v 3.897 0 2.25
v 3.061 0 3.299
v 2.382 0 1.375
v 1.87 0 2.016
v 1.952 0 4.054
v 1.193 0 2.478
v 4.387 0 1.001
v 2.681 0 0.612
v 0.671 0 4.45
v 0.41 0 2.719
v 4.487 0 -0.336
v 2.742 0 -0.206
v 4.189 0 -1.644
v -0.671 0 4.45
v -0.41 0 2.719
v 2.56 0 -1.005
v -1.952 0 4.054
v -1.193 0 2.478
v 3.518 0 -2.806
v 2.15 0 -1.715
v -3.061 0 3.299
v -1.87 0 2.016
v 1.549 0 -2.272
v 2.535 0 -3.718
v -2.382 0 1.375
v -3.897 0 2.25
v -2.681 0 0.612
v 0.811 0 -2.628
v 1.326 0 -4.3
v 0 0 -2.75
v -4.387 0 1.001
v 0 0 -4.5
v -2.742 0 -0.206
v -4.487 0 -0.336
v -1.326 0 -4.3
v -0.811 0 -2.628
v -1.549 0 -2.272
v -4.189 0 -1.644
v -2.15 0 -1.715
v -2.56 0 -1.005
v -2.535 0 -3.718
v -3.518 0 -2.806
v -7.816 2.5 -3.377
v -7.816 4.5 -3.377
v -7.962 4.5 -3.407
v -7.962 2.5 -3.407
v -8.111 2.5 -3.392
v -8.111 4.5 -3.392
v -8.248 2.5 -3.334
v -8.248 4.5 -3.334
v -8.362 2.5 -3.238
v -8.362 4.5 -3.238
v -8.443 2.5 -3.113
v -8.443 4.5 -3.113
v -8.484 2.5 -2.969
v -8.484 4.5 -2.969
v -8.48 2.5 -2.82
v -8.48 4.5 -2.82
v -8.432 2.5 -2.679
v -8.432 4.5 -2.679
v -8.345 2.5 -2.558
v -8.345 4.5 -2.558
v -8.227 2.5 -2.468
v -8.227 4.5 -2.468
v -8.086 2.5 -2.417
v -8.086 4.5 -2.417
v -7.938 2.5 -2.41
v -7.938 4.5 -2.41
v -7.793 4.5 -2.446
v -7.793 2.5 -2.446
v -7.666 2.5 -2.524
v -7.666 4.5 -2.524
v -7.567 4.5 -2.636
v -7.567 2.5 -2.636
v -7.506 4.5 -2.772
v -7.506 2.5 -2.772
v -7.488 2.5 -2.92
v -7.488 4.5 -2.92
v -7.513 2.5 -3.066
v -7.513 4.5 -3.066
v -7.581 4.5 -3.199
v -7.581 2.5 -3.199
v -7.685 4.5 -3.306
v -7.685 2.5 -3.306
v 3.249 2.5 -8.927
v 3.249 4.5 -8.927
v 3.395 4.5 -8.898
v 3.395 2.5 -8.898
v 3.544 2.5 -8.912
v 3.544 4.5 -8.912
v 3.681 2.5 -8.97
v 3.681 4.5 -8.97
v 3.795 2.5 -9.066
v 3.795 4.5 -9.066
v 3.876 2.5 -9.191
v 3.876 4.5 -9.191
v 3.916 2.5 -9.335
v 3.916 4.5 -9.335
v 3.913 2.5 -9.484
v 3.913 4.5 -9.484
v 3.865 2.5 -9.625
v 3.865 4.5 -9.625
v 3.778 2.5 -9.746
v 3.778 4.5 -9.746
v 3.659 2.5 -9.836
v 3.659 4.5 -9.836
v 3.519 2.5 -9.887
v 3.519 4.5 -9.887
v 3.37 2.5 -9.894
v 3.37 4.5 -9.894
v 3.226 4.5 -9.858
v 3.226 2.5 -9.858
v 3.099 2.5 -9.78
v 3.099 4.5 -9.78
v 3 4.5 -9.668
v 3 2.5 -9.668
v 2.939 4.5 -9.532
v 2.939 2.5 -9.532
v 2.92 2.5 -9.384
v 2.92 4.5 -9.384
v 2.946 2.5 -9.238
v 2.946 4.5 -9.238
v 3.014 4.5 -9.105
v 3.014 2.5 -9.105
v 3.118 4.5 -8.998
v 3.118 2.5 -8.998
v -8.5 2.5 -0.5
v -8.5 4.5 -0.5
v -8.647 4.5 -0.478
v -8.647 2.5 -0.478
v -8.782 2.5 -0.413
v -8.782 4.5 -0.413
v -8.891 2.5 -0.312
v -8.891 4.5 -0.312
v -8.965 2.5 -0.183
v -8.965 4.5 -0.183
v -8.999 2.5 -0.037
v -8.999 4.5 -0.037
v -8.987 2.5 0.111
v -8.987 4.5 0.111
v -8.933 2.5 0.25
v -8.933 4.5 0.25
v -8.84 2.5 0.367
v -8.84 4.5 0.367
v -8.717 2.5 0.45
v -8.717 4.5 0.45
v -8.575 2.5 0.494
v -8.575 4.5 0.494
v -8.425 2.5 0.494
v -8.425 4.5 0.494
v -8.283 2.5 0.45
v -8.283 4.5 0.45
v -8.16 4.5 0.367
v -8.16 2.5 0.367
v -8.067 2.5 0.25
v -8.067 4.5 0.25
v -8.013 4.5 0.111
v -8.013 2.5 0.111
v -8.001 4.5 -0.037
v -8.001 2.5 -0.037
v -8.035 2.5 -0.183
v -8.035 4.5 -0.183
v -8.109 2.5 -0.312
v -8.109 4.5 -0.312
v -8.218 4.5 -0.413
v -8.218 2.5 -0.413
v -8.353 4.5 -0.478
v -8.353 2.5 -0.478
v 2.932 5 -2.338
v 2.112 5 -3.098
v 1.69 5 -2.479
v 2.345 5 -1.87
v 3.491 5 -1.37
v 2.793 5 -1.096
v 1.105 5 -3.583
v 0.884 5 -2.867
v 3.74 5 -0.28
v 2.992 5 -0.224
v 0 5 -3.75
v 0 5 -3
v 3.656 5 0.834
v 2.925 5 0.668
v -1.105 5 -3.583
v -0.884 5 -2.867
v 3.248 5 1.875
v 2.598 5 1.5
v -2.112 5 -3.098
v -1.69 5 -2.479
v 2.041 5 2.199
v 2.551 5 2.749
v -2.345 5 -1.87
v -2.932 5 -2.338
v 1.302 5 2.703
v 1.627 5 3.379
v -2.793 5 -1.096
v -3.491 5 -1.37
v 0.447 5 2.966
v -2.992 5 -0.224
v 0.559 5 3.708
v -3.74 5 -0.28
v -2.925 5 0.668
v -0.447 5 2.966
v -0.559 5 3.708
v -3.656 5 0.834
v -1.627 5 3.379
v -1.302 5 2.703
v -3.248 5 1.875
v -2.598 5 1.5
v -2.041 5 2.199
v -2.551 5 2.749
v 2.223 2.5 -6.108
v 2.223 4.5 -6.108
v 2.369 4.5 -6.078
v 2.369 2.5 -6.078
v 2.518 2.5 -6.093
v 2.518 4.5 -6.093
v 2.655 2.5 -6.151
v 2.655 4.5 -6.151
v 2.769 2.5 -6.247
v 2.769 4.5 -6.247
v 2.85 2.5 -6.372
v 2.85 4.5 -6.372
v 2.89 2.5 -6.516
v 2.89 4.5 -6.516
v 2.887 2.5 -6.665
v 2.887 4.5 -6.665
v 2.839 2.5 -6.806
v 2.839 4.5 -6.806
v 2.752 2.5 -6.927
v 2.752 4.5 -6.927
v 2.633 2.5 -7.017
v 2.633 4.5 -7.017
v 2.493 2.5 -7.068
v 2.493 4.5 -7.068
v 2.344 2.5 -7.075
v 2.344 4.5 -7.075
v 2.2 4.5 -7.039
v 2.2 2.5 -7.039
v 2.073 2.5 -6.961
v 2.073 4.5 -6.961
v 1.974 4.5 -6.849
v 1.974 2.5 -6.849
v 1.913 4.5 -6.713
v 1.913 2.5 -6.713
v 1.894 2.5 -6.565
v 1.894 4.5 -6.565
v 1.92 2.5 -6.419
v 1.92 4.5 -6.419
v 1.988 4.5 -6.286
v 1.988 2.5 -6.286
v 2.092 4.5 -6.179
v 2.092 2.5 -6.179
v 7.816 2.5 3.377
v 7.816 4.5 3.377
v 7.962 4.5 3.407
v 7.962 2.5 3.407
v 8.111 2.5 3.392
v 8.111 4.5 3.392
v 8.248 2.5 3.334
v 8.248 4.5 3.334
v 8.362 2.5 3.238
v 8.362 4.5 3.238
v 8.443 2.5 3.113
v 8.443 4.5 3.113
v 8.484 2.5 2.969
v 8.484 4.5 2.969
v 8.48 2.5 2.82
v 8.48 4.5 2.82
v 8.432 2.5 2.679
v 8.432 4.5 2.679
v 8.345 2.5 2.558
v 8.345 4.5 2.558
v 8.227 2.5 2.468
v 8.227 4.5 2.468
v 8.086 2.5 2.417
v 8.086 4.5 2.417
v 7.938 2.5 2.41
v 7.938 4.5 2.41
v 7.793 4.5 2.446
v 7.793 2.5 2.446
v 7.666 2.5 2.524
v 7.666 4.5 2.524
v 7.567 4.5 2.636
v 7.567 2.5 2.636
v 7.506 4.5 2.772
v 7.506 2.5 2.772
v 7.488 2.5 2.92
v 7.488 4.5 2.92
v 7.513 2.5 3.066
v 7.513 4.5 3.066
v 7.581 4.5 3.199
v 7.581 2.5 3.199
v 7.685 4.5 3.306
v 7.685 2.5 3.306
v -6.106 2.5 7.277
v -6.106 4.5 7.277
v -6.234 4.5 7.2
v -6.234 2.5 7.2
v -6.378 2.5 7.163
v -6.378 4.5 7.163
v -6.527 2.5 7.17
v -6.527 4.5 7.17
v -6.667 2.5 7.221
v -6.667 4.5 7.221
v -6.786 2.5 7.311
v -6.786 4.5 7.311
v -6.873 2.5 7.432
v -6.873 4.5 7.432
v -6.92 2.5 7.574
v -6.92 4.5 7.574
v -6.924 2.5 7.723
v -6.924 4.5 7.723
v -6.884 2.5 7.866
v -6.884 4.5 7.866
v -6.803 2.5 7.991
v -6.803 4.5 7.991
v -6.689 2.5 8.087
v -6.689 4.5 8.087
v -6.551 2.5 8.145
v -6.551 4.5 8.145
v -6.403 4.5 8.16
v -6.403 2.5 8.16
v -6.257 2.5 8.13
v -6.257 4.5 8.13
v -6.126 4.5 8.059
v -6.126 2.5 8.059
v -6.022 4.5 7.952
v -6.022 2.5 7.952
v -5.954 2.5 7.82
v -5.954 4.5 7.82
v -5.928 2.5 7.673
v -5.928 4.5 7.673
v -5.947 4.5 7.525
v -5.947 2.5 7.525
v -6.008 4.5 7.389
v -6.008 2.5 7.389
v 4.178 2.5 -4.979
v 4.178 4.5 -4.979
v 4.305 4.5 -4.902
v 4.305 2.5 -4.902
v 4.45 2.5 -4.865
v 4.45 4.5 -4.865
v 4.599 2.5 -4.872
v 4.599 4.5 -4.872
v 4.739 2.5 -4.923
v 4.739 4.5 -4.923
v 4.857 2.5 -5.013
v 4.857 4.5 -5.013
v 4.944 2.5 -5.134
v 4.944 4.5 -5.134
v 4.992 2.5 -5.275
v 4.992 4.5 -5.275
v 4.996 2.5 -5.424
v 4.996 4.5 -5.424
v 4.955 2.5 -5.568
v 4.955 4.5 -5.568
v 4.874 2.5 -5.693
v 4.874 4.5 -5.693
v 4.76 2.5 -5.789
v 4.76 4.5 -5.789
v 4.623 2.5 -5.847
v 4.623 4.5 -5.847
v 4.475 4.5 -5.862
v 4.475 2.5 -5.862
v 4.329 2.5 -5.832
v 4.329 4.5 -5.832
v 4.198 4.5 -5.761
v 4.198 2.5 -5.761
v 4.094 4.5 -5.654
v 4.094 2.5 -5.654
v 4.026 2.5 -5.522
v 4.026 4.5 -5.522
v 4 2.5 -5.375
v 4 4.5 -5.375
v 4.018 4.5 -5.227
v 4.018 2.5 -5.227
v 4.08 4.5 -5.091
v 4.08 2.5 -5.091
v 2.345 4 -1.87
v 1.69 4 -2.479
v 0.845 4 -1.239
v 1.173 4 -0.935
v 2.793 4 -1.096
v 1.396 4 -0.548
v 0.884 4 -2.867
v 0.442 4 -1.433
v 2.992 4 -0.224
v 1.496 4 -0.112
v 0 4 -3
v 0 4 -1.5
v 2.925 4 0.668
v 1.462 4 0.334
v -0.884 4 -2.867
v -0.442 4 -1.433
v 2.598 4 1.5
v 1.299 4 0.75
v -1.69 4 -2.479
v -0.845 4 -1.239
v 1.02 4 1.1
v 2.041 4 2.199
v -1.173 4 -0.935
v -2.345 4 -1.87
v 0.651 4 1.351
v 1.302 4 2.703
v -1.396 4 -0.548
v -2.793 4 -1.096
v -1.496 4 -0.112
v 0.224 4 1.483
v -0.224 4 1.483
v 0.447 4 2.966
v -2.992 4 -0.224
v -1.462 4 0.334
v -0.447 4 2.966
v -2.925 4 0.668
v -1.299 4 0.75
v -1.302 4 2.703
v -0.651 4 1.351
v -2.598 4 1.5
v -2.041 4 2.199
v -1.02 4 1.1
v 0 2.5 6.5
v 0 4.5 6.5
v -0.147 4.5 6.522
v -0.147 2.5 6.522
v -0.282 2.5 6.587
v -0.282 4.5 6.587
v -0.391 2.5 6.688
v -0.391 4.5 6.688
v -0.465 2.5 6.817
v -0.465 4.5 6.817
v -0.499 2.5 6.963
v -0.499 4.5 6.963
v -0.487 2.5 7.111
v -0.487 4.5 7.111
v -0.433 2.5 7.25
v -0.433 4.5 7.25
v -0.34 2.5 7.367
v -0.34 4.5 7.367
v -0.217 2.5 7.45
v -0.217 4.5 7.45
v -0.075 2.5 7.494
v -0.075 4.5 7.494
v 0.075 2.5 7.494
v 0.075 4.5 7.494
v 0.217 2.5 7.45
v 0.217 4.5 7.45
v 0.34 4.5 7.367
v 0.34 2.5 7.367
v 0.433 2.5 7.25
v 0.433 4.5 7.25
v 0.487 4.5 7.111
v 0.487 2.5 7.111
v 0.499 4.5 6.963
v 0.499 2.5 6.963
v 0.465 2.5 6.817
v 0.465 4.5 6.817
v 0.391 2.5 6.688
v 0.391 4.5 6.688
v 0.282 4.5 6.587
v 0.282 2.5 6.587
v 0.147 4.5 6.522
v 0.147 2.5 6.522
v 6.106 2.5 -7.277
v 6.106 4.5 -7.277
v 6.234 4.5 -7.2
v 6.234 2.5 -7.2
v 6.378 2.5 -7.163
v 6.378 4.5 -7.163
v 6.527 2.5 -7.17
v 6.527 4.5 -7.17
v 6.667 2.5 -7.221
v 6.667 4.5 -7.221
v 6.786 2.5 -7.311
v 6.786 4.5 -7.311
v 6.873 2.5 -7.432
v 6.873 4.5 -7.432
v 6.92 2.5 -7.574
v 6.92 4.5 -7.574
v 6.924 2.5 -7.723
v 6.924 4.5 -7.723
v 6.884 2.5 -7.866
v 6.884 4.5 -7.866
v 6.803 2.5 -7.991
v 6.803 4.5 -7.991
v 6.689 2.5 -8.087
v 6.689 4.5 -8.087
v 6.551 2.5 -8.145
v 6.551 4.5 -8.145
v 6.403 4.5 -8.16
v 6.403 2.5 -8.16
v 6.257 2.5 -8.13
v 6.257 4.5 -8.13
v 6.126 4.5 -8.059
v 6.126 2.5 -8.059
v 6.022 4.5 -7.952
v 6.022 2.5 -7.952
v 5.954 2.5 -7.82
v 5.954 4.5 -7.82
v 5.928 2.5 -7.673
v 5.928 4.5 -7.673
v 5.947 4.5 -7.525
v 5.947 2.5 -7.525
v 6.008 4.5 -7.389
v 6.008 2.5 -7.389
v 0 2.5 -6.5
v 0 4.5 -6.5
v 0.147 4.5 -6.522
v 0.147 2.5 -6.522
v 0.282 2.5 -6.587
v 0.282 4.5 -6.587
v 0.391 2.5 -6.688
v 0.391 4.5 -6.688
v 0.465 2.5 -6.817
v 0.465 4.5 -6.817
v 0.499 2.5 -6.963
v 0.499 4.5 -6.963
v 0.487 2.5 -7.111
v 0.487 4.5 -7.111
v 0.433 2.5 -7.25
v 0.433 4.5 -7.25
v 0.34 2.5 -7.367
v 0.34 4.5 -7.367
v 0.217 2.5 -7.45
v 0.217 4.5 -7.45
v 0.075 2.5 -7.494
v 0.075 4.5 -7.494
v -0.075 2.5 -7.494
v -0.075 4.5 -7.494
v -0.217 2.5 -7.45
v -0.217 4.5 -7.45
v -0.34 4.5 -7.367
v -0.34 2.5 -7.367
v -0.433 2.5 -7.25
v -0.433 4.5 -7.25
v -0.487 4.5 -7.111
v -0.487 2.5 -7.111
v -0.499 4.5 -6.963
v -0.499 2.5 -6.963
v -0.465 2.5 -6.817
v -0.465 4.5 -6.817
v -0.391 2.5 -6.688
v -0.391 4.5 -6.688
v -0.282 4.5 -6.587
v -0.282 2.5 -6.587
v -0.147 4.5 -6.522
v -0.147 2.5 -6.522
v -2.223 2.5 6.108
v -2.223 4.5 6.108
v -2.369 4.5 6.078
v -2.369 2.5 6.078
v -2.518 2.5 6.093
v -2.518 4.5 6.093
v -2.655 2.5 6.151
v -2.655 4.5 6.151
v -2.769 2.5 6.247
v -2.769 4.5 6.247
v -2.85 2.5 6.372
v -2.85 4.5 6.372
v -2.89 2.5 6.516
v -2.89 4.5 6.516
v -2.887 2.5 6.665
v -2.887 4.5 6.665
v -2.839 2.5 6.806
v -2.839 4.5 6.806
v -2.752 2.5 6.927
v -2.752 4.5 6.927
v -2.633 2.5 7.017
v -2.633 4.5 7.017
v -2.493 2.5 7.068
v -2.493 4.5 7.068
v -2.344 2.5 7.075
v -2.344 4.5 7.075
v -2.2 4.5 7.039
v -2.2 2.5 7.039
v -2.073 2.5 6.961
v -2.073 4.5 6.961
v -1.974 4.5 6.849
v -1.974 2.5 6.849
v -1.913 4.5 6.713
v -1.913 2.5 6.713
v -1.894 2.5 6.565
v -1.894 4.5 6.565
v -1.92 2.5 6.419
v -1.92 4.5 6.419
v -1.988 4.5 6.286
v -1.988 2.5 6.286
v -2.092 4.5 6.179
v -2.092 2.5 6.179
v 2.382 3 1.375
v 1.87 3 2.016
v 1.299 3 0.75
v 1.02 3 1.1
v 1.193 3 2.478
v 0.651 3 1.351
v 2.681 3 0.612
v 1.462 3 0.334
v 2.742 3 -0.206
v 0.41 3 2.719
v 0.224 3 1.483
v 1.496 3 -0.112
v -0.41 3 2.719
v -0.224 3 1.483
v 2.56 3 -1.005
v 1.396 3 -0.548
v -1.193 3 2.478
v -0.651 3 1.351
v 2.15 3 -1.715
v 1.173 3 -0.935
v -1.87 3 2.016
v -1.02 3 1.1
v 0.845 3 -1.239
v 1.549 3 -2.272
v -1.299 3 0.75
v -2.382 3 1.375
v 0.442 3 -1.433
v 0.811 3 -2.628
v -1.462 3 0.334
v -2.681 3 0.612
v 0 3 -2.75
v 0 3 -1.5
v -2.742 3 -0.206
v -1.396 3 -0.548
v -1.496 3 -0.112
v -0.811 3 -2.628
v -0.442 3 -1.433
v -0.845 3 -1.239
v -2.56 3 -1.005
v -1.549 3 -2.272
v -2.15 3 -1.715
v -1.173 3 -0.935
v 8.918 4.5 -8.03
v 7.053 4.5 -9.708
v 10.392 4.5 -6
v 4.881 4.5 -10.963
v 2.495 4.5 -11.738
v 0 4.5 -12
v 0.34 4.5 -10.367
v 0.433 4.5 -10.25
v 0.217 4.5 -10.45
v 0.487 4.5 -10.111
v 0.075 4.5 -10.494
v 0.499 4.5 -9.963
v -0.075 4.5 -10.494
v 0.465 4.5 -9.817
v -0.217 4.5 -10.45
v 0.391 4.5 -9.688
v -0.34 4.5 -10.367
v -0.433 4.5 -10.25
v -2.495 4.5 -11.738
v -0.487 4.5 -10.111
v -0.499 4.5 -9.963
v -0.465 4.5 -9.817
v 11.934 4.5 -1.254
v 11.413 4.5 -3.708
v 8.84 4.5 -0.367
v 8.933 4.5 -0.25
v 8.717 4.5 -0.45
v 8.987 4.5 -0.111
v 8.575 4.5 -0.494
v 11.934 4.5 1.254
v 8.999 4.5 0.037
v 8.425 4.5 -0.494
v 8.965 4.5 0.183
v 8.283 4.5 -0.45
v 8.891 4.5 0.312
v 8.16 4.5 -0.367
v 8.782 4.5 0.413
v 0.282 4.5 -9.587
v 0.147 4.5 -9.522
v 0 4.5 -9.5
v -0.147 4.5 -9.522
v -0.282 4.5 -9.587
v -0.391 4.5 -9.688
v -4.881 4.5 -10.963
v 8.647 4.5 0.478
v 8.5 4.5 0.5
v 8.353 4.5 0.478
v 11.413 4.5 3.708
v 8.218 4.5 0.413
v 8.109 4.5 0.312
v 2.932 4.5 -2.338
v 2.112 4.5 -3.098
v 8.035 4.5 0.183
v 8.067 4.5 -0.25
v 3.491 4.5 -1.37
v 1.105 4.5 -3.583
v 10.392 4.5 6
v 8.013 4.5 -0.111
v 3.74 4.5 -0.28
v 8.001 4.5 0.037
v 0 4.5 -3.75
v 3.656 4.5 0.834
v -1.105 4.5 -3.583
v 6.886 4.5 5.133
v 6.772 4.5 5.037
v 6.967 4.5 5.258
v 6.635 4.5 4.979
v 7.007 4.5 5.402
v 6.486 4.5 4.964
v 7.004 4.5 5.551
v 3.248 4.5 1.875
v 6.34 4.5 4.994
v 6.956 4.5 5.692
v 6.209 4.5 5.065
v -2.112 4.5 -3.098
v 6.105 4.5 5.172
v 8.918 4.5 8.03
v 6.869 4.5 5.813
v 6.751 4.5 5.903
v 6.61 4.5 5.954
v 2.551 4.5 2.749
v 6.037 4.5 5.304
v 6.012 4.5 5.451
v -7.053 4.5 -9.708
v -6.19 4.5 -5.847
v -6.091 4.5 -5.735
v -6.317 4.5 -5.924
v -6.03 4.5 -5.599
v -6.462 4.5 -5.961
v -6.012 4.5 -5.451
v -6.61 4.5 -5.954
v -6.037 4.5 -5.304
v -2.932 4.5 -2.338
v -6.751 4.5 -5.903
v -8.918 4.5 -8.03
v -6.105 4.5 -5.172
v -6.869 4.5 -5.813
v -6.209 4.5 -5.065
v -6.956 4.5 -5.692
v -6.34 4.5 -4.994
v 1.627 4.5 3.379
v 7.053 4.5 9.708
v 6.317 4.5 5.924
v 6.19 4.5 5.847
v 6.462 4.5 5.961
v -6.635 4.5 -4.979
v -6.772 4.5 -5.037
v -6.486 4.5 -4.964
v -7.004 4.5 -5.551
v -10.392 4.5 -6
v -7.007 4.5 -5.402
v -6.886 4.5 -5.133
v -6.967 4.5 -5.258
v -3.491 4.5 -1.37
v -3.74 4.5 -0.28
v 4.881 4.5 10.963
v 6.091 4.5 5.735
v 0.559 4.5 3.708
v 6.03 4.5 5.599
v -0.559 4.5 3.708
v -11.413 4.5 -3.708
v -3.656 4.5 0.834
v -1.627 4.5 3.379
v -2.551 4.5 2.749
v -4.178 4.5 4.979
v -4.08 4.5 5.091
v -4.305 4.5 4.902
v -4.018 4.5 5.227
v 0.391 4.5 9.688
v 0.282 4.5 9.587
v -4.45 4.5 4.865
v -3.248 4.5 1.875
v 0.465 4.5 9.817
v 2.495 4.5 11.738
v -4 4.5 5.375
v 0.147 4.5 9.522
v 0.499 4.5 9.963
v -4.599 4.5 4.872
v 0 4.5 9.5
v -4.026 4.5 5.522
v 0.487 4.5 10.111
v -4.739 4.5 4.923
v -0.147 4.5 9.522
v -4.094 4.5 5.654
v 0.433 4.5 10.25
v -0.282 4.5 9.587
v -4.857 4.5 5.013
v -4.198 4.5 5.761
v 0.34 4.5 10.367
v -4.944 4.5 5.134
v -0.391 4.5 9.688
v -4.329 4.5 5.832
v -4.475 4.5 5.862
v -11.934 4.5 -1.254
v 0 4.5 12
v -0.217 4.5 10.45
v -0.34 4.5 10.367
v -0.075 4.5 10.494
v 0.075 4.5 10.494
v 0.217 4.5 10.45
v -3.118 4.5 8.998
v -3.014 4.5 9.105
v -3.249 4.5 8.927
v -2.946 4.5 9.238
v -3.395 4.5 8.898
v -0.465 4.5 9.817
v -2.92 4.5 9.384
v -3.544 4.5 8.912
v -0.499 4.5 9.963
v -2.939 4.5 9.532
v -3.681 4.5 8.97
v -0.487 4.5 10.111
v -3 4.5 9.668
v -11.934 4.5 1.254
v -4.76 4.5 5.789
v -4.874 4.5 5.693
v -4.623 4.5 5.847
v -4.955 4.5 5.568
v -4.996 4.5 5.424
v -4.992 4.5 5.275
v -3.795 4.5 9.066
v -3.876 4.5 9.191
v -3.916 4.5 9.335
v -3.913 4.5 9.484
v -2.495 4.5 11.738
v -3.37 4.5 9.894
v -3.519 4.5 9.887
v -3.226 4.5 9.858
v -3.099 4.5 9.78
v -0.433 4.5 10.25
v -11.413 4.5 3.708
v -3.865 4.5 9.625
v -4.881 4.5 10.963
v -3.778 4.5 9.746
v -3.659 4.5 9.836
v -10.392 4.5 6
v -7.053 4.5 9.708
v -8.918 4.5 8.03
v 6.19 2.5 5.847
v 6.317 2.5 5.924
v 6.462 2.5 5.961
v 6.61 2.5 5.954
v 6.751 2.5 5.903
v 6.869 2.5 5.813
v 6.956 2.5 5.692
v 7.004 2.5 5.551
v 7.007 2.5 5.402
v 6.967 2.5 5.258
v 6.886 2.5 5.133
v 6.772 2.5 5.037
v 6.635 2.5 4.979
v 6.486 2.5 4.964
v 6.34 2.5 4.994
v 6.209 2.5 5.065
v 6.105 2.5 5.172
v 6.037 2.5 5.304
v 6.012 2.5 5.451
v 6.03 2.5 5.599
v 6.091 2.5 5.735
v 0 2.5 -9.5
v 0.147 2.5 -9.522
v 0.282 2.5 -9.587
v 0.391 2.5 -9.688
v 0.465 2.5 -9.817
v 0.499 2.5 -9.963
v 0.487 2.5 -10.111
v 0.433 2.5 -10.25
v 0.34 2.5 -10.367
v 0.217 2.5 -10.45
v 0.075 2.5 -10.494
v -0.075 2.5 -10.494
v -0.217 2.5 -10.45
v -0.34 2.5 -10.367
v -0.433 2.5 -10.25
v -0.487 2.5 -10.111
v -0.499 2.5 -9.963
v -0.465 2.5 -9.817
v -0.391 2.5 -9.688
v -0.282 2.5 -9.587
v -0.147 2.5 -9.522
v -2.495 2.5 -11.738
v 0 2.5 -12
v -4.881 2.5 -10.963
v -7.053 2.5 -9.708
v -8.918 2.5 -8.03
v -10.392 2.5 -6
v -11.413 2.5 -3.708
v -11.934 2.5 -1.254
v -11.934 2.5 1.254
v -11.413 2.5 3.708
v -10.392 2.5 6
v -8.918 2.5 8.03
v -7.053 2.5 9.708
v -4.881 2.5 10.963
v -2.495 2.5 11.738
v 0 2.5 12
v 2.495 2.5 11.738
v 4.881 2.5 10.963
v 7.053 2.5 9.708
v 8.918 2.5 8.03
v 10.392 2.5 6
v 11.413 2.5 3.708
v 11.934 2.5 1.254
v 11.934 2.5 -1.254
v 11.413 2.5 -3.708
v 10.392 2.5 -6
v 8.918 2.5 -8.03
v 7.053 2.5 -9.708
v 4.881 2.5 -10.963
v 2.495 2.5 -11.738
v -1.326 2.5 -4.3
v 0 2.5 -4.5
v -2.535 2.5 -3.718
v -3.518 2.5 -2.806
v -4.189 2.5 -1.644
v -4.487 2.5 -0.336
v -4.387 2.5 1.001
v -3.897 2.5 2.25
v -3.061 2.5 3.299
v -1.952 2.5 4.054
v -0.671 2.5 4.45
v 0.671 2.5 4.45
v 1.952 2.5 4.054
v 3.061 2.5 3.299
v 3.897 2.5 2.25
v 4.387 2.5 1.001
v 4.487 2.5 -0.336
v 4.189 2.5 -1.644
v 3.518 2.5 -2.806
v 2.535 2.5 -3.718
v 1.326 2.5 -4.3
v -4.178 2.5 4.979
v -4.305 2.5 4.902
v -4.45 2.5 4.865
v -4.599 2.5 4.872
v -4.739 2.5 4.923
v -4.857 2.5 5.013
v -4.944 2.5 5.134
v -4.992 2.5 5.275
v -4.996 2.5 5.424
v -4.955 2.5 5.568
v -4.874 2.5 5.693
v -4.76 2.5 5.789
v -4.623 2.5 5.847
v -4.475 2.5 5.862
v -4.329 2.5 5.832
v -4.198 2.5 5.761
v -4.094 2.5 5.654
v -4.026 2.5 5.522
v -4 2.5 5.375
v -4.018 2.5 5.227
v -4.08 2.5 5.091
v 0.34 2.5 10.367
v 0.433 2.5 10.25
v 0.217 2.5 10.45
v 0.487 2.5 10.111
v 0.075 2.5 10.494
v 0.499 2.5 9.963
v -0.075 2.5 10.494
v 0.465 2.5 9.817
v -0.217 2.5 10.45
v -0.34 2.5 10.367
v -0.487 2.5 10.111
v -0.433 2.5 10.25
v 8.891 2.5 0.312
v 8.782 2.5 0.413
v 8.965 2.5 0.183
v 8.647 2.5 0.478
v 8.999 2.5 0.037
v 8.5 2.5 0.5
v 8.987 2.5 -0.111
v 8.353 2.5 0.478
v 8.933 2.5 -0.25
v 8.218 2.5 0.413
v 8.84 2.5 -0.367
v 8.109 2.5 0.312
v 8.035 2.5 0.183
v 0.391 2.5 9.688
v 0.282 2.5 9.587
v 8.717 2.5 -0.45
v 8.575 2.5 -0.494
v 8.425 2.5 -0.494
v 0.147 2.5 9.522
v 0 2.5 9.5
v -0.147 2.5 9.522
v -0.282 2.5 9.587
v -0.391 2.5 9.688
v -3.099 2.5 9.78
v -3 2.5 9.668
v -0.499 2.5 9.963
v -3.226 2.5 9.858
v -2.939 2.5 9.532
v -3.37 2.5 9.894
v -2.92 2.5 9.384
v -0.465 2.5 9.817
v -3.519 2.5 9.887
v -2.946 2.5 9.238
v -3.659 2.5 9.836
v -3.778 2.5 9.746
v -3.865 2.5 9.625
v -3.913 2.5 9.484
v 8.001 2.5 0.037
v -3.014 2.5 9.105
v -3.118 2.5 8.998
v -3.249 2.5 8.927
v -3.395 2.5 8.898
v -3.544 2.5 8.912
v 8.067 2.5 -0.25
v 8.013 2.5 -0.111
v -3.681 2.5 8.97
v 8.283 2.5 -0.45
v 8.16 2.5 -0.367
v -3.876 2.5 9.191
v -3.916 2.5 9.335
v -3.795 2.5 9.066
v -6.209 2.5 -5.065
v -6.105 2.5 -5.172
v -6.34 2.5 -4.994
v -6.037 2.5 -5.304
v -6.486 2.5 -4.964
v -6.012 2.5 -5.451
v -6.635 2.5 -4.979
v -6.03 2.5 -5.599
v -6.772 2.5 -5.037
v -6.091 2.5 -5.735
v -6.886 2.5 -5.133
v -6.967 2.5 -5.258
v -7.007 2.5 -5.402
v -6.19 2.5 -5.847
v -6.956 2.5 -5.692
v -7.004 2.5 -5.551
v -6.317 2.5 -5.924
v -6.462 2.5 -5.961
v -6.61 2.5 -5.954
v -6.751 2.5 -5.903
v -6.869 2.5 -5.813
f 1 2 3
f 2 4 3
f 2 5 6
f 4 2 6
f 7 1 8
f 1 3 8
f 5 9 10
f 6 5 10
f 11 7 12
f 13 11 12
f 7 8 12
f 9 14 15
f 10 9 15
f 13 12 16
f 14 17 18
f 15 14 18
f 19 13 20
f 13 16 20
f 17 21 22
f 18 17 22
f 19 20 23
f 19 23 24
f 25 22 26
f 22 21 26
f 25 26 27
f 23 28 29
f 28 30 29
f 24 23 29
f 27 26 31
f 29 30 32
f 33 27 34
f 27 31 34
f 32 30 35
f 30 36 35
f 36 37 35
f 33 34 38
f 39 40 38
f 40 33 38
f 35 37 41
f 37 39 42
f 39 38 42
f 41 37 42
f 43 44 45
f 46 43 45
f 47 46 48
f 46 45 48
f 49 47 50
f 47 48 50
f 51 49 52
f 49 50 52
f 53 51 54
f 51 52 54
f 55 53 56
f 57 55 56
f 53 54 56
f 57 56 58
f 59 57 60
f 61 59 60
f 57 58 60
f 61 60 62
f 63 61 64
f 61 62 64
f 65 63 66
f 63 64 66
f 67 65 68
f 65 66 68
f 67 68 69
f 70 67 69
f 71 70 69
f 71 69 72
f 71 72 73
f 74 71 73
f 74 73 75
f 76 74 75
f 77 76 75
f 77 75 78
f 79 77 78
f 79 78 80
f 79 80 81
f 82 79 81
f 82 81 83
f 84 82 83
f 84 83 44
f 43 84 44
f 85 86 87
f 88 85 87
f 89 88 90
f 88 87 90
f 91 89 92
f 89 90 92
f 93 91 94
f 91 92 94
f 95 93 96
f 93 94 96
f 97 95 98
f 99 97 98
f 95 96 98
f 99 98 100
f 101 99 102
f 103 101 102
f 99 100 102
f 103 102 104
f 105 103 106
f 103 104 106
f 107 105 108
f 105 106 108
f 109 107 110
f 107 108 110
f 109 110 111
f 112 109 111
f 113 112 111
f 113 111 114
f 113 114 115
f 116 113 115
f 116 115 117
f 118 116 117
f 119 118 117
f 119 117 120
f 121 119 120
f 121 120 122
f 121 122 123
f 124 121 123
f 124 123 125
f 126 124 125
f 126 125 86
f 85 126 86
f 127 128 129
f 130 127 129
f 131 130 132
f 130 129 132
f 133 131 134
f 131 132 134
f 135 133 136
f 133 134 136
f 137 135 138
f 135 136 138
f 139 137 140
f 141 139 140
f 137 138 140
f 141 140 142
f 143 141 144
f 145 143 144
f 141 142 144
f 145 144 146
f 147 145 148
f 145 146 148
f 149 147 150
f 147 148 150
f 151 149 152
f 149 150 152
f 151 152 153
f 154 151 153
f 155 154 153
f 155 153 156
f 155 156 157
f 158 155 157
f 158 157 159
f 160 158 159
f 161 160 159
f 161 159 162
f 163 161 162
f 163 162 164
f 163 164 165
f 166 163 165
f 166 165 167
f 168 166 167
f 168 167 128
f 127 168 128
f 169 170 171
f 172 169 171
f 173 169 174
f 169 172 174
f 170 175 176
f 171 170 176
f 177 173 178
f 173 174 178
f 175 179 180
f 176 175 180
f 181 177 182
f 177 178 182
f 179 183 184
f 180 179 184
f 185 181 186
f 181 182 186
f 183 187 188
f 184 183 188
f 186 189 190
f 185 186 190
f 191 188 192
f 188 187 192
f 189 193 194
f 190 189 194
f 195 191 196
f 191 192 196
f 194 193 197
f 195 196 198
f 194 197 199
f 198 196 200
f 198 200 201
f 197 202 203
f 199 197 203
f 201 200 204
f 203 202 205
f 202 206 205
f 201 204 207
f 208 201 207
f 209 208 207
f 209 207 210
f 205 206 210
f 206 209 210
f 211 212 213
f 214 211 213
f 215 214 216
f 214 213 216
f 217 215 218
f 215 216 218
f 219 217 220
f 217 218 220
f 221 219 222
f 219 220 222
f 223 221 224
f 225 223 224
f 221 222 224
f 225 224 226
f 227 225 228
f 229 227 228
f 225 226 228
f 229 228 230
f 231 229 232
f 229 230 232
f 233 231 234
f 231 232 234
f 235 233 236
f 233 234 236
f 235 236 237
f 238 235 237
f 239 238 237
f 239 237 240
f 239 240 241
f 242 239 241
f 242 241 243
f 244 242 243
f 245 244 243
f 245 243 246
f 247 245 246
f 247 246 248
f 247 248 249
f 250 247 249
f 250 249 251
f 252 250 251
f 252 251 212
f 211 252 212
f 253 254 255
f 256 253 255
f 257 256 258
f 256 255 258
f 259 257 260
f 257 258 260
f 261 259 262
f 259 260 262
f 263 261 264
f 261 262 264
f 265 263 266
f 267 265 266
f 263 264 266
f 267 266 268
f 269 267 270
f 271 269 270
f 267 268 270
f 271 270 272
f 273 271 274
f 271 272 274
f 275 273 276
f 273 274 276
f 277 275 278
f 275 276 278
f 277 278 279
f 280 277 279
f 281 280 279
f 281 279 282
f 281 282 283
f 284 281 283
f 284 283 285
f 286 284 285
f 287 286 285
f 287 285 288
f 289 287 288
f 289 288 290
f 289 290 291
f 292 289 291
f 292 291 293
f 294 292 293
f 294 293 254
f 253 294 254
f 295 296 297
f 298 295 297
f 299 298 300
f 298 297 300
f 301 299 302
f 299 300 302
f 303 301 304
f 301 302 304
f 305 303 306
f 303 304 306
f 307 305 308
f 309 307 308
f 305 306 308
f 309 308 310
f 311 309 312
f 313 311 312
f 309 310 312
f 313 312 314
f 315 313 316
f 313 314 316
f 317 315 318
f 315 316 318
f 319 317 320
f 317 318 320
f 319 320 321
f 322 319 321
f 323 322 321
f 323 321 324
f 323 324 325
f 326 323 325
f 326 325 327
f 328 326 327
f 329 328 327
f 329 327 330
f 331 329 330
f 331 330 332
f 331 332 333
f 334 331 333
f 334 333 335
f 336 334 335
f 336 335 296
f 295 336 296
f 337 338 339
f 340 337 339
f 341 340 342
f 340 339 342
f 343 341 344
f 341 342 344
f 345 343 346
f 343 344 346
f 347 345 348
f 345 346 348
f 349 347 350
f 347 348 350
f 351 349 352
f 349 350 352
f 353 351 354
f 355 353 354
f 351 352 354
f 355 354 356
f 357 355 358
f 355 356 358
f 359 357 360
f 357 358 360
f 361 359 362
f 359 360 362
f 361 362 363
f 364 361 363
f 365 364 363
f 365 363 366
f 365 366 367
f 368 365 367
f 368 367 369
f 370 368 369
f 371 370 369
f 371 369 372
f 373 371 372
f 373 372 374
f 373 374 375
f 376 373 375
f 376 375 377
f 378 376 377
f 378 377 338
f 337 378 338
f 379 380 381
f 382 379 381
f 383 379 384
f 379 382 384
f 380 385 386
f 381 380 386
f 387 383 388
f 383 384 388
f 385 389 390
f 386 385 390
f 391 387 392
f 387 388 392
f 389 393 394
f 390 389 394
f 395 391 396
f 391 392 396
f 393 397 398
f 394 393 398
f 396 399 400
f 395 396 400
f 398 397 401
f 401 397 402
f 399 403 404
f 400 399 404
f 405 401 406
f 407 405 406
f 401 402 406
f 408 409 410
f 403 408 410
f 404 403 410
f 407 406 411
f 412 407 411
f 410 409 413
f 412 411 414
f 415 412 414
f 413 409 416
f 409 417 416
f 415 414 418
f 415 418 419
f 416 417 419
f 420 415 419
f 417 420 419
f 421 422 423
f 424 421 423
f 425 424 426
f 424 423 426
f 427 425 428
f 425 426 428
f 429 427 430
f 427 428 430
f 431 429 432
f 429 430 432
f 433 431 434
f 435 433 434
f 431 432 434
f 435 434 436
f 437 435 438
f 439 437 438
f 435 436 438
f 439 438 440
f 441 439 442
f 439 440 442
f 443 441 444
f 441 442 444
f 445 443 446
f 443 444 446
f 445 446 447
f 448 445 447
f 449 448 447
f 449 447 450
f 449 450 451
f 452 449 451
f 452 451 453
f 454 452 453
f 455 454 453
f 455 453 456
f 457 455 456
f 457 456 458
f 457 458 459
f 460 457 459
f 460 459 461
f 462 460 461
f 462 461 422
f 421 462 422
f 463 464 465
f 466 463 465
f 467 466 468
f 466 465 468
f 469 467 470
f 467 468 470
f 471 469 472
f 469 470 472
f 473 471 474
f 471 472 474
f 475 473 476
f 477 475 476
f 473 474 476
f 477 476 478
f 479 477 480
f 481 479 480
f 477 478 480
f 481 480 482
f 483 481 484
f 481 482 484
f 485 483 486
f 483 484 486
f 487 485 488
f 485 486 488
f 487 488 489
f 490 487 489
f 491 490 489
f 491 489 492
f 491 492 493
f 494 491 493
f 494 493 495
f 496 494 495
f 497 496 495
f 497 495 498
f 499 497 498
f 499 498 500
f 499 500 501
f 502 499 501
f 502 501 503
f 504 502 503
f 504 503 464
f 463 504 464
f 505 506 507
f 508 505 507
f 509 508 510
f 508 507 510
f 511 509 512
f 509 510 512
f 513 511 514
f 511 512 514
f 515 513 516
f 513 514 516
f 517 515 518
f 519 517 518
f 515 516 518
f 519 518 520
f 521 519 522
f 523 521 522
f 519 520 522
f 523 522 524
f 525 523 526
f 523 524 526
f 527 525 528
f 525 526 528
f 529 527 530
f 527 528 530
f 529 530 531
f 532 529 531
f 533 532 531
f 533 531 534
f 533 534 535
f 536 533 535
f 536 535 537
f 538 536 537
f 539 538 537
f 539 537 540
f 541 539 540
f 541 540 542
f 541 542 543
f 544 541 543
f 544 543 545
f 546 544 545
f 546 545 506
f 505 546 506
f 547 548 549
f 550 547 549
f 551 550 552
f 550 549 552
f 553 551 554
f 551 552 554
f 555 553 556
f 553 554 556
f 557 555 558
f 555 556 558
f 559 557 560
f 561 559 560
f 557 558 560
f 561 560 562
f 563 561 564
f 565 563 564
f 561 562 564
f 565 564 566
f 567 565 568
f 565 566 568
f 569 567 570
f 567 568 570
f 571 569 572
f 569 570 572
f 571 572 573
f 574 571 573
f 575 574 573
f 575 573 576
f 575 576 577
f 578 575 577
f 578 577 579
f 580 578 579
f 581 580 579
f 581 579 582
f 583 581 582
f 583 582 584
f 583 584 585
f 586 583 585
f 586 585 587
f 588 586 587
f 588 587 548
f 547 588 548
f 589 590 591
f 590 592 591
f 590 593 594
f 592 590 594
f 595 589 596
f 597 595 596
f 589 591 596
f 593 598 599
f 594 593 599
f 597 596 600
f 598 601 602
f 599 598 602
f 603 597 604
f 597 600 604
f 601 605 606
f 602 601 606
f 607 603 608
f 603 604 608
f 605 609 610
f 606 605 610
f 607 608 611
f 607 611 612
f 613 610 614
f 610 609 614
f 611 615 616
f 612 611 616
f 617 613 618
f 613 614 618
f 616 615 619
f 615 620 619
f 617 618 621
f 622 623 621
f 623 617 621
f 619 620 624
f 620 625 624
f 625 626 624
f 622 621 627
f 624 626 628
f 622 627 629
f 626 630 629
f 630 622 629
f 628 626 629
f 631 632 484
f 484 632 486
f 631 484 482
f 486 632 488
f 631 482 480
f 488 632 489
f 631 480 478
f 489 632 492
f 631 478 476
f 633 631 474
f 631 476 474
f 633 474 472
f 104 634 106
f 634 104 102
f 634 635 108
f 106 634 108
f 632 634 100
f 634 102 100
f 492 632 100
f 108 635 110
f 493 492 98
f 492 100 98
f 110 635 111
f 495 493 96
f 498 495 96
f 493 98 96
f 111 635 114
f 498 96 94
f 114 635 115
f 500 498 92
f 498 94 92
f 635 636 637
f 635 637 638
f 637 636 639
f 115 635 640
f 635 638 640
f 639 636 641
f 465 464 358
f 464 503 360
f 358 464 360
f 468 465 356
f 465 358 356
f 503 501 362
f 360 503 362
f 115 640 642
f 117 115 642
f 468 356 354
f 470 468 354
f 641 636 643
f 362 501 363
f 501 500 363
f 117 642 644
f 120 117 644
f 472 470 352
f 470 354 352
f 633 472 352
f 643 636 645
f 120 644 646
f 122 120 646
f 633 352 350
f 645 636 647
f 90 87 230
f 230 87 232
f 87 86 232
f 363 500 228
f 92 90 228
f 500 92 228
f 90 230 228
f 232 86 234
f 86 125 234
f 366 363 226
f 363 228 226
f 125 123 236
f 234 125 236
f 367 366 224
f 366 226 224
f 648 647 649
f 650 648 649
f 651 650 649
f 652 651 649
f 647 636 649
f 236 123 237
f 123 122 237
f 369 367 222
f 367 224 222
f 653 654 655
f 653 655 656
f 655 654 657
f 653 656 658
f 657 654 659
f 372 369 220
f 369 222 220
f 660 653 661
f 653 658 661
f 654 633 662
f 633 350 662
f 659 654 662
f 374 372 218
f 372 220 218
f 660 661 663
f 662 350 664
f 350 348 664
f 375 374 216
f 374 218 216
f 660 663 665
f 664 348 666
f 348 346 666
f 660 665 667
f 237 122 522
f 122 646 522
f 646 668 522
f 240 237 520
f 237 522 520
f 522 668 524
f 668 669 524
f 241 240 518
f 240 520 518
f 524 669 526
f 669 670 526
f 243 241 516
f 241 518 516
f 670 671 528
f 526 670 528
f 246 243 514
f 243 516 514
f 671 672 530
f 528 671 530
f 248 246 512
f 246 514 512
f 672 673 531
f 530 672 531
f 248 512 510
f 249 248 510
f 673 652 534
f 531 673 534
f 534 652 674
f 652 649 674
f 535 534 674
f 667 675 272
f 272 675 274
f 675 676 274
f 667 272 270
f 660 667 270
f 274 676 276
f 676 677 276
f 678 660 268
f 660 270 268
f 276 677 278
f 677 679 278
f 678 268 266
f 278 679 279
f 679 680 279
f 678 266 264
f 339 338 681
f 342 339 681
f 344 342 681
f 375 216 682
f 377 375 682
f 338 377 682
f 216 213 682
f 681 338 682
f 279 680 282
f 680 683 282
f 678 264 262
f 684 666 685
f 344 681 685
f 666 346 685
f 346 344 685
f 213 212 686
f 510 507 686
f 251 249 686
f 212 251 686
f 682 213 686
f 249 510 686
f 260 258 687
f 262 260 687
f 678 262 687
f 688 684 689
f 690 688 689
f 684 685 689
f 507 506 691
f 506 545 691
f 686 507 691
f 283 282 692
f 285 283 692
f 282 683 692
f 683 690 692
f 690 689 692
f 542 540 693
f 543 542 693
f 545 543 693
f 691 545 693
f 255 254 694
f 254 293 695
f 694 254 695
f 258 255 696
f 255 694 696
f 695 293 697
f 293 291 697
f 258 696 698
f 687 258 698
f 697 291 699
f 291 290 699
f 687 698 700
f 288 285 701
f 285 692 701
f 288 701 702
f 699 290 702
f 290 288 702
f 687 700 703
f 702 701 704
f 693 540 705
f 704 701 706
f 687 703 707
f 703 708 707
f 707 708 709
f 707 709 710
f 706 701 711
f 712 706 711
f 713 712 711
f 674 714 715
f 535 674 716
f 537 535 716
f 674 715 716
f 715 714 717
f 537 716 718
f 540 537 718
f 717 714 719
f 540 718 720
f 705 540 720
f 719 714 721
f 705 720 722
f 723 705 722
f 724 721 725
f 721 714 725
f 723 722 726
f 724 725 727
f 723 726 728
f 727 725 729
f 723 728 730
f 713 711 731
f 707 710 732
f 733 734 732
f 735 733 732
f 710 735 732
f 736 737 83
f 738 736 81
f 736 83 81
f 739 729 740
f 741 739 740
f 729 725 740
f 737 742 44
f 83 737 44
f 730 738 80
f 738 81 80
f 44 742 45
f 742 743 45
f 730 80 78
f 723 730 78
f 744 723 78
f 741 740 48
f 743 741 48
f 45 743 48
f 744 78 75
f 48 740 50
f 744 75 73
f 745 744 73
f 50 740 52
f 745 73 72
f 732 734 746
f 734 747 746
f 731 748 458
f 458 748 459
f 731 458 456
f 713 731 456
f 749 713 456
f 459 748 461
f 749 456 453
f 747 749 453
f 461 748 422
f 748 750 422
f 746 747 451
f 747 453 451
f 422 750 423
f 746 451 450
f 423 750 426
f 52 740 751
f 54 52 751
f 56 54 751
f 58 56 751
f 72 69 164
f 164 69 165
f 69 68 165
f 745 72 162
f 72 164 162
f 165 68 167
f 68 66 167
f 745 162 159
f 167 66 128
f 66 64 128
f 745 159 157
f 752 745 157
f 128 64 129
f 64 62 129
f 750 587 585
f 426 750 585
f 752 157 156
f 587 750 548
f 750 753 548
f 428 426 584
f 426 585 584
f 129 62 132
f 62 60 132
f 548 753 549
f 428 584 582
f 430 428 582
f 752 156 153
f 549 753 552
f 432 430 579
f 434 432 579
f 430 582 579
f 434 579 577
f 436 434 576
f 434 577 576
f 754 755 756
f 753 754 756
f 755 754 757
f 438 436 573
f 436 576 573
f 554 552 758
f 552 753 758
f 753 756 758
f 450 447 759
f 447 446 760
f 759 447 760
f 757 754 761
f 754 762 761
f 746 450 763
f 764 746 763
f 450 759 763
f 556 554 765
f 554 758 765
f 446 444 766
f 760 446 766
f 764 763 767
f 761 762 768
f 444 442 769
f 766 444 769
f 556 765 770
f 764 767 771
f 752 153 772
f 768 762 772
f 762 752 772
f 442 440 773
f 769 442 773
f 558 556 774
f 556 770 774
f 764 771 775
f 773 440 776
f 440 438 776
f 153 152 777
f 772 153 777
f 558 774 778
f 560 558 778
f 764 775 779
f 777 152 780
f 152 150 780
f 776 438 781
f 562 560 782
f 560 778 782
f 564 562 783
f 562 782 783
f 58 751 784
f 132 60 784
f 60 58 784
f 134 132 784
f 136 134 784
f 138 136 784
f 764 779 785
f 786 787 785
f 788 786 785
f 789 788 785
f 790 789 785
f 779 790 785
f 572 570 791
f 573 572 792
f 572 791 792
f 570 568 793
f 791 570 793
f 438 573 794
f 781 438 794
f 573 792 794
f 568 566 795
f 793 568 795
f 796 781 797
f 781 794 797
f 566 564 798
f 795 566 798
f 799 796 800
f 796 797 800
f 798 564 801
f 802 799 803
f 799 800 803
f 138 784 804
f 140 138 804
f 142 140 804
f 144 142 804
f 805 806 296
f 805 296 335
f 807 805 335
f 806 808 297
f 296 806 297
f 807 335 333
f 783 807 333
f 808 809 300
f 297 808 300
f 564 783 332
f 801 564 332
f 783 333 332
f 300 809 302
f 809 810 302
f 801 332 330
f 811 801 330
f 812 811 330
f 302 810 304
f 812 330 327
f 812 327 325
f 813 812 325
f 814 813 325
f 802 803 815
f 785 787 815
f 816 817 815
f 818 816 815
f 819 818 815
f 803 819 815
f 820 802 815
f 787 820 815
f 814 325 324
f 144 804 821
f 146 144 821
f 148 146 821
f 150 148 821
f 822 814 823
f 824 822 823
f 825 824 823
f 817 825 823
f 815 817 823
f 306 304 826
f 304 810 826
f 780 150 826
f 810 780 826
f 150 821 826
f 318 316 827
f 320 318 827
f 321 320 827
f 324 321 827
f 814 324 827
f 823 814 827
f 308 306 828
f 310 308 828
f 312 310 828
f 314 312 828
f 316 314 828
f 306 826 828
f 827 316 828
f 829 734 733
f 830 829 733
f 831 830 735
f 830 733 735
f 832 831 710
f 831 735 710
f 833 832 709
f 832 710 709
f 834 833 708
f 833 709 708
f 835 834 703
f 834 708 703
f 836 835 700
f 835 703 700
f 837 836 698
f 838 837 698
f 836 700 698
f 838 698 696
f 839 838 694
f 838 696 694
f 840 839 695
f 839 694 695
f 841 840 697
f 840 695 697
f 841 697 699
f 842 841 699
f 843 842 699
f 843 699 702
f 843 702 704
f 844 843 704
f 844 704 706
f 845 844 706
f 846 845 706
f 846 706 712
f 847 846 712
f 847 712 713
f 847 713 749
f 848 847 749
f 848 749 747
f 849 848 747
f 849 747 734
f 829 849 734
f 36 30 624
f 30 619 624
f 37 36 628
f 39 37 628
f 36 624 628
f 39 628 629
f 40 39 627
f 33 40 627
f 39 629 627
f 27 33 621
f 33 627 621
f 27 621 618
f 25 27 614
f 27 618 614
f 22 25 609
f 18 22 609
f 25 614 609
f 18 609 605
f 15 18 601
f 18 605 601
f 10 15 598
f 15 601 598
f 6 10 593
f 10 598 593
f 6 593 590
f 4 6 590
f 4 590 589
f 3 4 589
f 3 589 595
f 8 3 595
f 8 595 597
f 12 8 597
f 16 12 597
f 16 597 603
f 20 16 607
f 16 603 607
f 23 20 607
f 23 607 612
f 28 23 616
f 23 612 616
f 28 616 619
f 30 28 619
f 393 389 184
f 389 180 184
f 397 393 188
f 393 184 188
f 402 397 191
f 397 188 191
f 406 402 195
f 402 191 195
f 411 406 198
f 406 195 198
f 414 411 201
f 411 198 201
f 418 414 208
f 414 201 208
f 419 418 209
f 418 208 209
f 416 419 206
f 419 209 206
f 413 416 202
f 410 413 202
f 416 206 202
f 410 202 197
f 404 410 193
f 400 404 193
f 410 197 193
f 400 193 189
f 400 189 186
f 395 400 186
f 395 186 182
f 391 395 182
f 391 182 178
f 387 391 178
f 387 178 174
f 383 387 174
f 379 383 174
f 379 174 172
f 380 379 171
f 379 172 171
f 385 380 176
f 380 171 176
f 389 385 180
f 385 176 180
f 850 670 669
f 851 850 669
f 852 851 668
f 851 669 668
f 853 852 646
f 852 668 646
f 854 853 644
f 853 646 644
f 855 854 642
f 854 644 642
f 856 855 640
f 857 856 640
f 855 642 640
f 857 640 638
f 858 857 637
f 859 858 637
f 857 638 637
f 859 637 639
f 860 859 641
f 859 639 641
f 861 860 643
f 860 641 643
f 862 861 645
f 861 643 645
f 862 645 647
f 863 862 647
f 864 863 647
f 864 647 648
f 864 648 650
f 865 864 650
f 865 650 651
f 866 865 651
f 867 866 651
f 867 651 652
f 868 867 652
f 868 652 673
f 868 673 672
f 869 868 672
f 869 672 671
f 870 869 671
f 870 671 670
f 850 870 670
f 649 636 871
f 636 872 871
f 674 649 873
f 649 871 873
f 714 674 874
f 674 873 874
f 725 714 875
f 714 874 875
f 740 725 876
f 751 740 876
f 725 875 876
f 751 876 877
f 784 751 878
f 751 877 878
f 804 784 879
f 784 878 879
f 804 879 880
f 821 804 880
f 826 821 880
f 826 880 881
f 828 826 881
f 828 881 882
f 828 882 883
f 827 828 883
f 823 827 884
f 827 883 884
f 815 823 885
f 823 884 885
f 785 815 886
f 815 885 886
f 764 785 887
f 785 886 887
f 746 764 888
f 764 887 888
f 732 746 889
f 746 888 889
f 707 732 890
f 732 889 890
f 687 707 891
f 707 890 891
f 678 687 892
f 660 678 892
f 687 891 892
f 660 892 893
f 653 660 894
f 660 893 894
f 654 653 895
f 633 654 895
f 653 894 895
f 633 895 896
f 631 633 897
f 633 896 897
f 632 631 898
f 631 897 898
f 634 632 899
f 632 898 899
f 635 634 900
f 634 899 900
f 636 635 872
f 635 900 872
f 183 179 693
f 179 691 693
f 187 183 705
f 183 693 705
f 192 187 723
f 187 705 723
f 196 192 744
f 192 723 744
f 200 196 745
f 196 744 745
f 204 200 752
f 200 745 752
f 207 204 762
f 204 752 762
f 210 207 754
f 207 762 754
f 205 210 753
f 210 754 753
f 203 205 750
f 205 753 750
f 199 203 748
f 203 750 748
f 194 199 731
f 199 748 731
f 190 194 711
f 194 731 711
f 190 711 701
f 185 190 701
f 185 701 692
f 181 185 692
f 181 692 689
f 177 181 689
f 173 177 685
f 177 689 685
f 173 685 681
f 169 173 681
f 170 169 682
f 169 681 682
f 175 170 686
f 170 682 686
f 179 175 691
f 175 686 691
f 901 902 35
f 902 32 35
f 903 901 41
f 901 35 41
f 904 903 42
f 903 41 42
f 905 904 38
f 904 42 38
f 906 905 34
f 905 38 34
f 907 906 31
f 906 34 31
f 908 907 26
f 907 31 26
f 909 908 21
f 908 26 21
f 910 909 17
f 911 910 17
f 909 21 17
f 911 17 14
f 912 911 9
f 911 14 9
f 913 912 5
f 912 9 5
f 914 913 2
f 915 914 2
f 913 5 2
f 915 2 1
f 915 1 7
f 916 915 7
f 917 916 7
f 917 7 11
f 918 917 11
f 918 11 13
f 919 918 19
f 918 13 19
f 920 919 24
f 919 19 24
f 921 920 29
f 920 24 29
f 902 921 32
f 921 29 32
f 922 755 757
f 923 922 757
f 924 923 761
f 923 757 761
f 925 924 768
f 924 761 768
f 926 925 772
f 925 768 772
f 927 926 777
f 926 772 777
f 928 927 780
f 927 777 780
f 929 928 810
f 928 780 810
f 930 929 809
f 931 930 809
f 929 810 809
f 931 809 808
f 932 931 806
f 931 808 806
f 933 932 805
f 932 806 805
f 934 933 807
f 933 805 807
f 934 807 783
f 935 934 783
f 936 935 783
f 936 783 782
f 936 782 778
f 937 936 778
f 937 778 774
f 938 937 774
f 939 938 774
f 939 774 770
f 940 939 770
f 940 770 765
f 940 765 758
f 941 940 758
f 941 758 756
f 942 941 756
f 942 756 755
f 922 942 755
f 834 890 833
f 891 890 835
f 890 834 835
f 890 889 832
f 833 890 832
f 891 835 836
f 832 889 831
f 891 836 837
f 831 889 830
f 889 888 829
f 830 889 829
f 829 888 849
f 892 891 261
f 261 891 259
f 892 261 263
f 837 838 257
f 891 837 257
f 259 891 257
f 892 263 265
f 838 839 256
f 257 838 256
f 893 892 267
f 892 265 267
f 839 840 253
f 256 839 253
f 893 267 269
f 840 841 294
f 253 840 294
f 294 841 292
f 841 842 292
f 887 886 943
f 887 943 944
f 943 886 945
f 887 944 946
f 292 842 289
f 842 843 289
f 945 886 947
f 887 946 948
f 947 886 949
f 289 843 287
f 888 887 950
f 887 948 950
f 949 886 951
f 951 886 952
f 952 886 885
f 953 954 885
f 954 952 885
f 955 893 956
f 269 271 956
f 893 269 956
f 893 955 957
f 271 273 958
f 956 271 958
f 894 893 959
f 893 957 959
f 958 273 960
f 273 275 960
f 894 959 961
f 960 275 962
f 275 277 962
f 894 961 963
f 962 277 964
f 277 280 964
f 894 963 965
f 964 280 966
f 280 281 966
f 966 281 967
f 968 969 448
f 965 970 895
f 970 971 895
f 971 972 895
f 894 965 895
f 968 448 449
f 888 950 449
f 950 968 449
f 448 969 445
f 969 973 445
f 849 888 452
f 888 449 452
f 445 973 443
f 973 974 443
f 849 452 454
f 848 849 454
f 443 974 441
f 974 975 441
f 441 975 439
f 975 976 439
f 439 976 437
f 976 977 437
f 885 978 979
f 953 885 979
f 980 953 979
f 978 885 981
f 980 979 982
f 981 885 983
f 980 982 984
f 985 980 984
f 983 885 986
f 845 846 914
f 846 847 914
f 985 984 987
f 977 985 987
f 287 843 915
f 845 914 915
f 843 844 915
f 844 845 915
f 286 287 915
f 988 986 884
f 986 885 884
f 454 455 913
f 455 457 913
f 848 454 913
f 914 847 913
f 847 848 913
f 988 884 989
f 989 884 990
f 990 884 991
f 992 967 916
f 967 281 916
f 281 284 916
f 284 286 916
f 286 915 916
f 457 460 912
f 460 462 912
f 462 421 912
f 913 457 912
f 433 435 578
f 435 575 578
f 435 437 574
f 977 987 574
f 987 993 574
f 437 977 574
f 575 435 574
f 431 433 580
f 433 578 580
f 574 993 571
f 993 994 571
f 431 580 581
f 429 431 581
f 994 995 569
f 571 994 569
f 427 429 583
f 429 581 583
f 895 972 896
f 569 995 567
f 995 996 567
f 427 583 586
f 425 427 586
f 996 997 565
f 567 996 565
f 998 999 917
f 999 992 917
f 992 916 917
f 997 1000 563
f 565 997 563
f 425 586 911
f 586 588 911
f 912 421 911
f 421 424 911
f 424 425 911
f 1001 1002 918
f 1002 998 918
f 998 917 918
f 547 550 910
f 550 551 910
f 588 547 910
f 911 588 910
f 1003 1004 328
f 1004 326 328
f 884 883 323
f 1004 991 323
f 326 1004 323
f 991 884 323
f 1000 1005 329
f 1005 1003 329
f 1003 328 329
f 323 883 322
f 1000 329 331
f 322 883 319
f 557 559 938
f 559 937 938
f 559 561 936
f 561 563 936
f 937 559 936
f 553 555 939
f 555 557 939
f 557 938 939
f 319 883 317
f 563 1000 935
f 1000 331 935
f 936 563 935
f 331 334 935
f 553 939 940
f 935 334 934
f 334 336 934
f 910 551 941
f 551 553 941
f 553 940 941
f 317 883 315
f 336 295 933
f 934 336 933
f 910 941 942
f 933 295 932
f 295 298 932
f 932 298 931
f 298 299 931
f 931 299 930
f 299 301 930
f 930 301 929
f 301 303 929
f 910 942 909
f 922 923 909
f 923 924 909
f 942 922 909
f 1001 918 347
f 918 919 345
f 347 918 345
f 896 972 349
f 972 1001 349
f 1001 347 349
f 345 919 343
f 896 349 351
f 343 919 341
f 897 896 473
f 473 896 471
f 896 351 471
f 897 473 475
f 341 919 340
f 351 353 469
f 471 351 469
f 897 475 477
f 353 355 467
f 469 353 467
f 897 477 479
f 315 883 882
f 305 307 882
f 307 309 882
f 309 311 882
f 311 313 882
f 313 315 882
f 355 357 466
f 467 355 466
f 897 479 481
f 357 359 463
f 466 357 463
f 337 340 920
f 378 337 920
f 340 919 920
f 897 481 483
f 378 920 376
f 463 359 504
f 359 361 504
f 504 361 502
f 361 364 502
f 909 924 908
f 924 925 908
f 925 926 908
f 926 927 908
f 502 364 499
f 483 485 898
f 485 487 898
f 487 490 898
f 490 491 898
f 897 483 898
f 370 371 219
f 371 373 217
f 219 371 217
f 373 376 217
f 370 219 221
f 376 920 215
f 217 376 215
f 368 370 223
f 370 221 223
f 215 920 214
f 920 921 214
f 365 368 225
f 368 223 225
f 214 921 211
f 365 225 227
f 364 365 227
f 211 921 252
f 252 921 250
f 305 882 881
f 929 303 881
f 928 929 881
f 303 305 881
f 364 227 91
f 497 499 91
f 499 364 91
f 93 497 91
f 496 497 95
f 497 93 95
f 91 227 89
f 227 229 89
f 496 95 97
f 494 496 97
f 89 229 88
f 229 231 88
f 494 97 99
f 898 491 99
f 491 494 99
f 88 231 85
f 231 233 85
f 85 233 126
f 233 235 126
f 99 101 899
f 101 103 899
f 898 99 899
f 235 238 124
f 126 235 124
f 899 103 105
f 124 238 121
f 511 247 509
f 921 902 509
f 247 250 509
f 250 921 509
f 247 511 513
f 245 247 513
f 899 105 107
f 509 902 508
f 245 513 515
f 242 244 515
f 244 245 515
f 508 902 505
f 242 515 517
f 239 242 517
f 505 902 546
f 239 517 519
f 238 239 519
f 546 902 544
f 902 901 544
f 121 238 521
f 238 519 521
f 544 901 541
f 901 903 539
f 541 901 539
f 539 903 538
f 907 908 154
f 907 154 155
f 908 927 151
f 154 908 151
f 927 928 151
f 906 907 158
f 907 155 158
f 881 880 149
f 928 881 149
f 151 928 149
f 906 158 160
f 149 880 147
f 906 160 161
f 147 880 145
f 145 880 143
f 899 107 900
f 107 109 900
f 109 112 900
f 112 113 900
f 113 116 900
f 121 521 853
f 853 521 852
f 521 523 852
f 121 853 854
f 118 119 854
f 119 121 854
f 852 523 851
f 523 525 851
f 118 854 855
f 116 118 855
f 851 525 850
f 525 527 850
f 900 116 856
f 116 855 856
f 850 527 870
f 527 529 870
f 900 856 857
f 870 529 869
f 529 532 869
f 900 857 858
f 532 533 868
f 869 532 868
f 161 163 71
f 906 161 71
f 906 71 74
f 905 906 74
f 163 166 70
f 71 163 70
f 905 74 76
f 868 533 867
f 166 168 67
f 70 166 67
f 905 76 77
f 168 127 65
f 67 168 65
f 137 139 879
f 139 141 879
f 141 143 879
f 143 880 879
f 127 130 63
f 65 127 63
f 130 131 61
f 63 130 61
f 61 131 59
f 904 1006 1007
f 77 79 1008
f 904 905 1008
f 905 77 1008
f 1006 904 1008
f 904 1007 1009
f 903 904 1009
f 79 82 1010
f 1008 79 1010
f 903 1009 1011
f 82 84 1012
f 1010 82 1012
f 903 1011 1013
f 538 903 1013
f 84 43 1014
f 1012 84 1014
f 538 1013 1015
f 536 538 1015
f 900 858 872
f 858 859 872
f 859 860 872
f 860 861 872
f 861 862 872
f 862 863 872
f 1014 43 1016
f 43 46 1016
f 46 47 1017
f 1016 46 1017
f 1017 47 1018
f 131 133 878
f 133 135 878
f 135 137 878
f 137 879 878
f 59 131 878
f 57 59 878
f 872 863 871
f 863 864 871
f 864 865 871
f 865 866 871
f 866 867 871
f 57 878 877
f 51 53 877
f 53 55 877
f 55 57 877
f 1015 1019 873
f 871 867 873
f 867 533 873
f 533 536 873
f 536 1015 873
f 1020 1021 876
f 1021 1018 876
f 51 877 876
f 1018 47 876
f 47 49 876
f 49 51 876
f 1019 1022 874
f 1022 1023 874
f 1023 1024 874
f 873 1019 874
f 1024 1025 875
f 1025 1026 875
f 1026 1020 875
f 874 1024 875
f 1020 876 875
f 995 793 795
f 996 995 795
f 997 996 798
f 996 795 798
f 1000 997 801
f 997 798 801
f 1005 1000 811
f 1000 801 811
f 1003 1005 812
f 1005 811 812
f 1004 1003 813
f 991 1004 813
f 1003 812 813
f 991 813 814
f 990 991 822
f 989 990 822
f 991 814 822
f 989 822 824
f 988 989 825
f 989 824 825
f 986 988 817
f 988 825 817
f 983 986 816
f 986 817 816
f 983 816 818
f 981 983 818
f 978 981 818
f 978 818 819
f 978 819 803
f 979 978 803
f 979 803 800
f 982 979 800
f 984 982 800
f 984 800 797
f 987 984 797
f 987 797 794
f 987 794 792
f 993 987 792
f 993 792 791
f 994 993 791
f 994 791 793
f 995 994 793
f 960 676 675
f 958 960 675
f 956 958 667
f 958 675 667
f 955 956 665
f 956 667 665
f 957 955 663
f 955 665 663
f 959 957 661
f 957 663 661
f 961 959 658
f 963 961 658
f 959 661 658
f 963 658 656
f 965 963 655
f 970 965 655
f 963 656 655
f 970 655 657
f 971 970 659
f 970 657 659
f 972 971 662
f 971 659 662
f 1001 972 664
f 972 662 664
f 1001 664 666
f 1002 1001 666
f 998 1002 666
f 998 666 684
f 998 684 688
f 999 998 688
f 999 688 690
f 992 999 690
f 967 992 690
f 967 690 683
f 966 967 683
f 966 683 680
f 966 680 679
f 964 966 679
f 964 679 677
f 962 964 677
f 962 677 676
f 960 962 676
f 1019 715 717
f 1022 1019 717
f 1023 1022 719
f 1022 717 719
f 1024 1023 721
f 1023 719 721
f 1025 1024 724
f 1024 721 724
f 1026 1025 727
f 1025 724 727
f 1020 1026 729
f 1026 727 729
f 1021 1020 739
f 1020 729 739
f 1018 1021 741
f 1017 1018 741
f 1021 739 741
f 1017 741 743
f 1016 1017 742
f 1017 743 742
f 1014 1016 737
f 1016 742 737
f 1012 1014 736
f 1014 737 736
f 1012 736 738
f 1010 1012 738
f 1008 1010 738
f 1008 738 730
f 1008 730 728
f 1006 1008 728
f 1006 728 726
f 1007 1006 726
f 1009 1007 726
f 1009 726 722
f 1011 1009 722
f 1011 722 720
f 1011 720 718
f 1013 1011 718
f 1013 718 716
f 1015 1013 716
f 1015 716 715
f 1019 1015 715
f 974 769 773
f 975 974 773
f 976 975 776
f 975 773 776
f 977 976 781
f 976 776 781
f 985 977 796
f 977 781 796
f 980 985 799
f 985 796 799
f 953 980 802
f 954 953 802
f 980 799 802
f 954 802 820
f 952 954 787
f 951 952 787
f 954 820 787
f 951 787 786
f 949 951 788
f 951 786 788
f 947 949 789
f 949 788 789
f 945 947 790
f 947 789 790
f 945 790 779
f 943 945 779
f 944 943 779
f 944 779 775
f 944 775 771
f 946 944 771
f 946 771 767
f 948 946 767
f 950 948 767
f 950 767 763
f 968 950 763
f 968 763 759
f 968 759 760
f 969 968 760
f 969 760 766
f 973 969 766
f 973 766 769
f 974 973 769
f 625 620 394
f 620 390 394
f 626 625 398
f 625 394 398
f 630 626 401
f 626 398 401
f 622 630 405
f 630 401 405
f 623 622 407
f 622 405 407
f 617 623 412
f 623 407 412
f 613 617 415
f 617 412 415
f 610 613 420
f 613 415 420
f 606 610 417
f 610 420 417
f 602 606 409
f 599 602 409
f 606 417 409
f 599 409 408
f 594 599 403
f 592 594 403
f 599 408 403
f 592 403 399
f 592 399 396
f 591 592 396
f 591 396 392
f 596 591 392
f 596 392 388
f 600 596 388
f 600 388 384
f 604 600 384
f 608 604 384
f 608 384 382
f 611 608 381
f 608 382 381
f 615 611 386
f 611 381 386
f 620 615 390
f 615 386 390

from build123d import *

# Parameters (mm, degrees)
ESQUISSE2_R                  = 0.5
ENL_V_MAT_EXTRU_1_DEPTH      = 10
R_P_TITION_CIRCULAIRE1_COUNT = 3
R_P_TITION_CIRCULAIRE1_ANGLE = 40


with BuildPart() as part:
    # Esquisse1 → Révolution1 (revolve)
    with BuildSketch(Plane.XY, mode=Mode.PRIVATE) as r_volution1_sk:
        Polygon((2.75, 0), (2.75, 3), (1.5, 3), (1.5, 4), (3, 4), (3, 5), (3.75, 5), (3.75, 4.5), (12, 4.5), (12, 2.5), (4.5, 2.5), (4.5, 0), align=None)
    revolve(r_volution1_sk.sketch.rotate(Axis((0, 0, 0), (0, 1, 0)), 90), axis=Axis((0, 0, 0), (0, 1, 0)))

    # Esquisse2 → Enlèv. mat.-Extru.1 (cut)
    with BuildSketch(Plane(origin=(0, 4.5, 0), x_dir=(1, 0, 0), z_dir=(0, 1, 0))):
        with Locations(Location((0, 10, 0), (0, 0, 270))):
            Circle(ESQUISSE2_R)
        with Locations(Location((8.5, 0, 0), (0, 0, 270))):
            Circle(ESQUISSE2_R)
        with Locations(Location((0, 7, 0), (0, 0, 270))):
            Circle(ESQUISSE2_R)
        with Locations(Location((0, -7, 0), (0, 0, 90))):
            Circle(ESQUISSE2_R)
        with Locations(Location((0, -10, 0), (0, 0, 90))):
            Circle(ESQUISSE2_R)
        with Locations(Location((-8.5, 0, 0), (0, 0, 90))):
            Circle(ESQUISSE2_R)
    enl_v_mat_extru_1 = extrude(amount=-ENL_V_MAT_EXTRU_1_DEPTH, mode=Mode.SUBTRACT)

    # Répétition circulaire1: Enlèv. mat.-Extru.1 ×3 about axis
    r_p_tition_circulaire1_axis = Axis((0, 0, 0), (0, -1, 0))
    for i in range(1, R_P_TITION_CIRCULAIRE1_COUNT):
        add(enl_v_mat_extru_1.rotate(r_p_tition_circulaire1_axis, i * R_P_TITION_CIRCULAIRE1_ANGLE / (R_P_TITION_CIRCULAIRE1_COUNT - 1)), mode=Mode.SUBTRACT)


solid = part.part
